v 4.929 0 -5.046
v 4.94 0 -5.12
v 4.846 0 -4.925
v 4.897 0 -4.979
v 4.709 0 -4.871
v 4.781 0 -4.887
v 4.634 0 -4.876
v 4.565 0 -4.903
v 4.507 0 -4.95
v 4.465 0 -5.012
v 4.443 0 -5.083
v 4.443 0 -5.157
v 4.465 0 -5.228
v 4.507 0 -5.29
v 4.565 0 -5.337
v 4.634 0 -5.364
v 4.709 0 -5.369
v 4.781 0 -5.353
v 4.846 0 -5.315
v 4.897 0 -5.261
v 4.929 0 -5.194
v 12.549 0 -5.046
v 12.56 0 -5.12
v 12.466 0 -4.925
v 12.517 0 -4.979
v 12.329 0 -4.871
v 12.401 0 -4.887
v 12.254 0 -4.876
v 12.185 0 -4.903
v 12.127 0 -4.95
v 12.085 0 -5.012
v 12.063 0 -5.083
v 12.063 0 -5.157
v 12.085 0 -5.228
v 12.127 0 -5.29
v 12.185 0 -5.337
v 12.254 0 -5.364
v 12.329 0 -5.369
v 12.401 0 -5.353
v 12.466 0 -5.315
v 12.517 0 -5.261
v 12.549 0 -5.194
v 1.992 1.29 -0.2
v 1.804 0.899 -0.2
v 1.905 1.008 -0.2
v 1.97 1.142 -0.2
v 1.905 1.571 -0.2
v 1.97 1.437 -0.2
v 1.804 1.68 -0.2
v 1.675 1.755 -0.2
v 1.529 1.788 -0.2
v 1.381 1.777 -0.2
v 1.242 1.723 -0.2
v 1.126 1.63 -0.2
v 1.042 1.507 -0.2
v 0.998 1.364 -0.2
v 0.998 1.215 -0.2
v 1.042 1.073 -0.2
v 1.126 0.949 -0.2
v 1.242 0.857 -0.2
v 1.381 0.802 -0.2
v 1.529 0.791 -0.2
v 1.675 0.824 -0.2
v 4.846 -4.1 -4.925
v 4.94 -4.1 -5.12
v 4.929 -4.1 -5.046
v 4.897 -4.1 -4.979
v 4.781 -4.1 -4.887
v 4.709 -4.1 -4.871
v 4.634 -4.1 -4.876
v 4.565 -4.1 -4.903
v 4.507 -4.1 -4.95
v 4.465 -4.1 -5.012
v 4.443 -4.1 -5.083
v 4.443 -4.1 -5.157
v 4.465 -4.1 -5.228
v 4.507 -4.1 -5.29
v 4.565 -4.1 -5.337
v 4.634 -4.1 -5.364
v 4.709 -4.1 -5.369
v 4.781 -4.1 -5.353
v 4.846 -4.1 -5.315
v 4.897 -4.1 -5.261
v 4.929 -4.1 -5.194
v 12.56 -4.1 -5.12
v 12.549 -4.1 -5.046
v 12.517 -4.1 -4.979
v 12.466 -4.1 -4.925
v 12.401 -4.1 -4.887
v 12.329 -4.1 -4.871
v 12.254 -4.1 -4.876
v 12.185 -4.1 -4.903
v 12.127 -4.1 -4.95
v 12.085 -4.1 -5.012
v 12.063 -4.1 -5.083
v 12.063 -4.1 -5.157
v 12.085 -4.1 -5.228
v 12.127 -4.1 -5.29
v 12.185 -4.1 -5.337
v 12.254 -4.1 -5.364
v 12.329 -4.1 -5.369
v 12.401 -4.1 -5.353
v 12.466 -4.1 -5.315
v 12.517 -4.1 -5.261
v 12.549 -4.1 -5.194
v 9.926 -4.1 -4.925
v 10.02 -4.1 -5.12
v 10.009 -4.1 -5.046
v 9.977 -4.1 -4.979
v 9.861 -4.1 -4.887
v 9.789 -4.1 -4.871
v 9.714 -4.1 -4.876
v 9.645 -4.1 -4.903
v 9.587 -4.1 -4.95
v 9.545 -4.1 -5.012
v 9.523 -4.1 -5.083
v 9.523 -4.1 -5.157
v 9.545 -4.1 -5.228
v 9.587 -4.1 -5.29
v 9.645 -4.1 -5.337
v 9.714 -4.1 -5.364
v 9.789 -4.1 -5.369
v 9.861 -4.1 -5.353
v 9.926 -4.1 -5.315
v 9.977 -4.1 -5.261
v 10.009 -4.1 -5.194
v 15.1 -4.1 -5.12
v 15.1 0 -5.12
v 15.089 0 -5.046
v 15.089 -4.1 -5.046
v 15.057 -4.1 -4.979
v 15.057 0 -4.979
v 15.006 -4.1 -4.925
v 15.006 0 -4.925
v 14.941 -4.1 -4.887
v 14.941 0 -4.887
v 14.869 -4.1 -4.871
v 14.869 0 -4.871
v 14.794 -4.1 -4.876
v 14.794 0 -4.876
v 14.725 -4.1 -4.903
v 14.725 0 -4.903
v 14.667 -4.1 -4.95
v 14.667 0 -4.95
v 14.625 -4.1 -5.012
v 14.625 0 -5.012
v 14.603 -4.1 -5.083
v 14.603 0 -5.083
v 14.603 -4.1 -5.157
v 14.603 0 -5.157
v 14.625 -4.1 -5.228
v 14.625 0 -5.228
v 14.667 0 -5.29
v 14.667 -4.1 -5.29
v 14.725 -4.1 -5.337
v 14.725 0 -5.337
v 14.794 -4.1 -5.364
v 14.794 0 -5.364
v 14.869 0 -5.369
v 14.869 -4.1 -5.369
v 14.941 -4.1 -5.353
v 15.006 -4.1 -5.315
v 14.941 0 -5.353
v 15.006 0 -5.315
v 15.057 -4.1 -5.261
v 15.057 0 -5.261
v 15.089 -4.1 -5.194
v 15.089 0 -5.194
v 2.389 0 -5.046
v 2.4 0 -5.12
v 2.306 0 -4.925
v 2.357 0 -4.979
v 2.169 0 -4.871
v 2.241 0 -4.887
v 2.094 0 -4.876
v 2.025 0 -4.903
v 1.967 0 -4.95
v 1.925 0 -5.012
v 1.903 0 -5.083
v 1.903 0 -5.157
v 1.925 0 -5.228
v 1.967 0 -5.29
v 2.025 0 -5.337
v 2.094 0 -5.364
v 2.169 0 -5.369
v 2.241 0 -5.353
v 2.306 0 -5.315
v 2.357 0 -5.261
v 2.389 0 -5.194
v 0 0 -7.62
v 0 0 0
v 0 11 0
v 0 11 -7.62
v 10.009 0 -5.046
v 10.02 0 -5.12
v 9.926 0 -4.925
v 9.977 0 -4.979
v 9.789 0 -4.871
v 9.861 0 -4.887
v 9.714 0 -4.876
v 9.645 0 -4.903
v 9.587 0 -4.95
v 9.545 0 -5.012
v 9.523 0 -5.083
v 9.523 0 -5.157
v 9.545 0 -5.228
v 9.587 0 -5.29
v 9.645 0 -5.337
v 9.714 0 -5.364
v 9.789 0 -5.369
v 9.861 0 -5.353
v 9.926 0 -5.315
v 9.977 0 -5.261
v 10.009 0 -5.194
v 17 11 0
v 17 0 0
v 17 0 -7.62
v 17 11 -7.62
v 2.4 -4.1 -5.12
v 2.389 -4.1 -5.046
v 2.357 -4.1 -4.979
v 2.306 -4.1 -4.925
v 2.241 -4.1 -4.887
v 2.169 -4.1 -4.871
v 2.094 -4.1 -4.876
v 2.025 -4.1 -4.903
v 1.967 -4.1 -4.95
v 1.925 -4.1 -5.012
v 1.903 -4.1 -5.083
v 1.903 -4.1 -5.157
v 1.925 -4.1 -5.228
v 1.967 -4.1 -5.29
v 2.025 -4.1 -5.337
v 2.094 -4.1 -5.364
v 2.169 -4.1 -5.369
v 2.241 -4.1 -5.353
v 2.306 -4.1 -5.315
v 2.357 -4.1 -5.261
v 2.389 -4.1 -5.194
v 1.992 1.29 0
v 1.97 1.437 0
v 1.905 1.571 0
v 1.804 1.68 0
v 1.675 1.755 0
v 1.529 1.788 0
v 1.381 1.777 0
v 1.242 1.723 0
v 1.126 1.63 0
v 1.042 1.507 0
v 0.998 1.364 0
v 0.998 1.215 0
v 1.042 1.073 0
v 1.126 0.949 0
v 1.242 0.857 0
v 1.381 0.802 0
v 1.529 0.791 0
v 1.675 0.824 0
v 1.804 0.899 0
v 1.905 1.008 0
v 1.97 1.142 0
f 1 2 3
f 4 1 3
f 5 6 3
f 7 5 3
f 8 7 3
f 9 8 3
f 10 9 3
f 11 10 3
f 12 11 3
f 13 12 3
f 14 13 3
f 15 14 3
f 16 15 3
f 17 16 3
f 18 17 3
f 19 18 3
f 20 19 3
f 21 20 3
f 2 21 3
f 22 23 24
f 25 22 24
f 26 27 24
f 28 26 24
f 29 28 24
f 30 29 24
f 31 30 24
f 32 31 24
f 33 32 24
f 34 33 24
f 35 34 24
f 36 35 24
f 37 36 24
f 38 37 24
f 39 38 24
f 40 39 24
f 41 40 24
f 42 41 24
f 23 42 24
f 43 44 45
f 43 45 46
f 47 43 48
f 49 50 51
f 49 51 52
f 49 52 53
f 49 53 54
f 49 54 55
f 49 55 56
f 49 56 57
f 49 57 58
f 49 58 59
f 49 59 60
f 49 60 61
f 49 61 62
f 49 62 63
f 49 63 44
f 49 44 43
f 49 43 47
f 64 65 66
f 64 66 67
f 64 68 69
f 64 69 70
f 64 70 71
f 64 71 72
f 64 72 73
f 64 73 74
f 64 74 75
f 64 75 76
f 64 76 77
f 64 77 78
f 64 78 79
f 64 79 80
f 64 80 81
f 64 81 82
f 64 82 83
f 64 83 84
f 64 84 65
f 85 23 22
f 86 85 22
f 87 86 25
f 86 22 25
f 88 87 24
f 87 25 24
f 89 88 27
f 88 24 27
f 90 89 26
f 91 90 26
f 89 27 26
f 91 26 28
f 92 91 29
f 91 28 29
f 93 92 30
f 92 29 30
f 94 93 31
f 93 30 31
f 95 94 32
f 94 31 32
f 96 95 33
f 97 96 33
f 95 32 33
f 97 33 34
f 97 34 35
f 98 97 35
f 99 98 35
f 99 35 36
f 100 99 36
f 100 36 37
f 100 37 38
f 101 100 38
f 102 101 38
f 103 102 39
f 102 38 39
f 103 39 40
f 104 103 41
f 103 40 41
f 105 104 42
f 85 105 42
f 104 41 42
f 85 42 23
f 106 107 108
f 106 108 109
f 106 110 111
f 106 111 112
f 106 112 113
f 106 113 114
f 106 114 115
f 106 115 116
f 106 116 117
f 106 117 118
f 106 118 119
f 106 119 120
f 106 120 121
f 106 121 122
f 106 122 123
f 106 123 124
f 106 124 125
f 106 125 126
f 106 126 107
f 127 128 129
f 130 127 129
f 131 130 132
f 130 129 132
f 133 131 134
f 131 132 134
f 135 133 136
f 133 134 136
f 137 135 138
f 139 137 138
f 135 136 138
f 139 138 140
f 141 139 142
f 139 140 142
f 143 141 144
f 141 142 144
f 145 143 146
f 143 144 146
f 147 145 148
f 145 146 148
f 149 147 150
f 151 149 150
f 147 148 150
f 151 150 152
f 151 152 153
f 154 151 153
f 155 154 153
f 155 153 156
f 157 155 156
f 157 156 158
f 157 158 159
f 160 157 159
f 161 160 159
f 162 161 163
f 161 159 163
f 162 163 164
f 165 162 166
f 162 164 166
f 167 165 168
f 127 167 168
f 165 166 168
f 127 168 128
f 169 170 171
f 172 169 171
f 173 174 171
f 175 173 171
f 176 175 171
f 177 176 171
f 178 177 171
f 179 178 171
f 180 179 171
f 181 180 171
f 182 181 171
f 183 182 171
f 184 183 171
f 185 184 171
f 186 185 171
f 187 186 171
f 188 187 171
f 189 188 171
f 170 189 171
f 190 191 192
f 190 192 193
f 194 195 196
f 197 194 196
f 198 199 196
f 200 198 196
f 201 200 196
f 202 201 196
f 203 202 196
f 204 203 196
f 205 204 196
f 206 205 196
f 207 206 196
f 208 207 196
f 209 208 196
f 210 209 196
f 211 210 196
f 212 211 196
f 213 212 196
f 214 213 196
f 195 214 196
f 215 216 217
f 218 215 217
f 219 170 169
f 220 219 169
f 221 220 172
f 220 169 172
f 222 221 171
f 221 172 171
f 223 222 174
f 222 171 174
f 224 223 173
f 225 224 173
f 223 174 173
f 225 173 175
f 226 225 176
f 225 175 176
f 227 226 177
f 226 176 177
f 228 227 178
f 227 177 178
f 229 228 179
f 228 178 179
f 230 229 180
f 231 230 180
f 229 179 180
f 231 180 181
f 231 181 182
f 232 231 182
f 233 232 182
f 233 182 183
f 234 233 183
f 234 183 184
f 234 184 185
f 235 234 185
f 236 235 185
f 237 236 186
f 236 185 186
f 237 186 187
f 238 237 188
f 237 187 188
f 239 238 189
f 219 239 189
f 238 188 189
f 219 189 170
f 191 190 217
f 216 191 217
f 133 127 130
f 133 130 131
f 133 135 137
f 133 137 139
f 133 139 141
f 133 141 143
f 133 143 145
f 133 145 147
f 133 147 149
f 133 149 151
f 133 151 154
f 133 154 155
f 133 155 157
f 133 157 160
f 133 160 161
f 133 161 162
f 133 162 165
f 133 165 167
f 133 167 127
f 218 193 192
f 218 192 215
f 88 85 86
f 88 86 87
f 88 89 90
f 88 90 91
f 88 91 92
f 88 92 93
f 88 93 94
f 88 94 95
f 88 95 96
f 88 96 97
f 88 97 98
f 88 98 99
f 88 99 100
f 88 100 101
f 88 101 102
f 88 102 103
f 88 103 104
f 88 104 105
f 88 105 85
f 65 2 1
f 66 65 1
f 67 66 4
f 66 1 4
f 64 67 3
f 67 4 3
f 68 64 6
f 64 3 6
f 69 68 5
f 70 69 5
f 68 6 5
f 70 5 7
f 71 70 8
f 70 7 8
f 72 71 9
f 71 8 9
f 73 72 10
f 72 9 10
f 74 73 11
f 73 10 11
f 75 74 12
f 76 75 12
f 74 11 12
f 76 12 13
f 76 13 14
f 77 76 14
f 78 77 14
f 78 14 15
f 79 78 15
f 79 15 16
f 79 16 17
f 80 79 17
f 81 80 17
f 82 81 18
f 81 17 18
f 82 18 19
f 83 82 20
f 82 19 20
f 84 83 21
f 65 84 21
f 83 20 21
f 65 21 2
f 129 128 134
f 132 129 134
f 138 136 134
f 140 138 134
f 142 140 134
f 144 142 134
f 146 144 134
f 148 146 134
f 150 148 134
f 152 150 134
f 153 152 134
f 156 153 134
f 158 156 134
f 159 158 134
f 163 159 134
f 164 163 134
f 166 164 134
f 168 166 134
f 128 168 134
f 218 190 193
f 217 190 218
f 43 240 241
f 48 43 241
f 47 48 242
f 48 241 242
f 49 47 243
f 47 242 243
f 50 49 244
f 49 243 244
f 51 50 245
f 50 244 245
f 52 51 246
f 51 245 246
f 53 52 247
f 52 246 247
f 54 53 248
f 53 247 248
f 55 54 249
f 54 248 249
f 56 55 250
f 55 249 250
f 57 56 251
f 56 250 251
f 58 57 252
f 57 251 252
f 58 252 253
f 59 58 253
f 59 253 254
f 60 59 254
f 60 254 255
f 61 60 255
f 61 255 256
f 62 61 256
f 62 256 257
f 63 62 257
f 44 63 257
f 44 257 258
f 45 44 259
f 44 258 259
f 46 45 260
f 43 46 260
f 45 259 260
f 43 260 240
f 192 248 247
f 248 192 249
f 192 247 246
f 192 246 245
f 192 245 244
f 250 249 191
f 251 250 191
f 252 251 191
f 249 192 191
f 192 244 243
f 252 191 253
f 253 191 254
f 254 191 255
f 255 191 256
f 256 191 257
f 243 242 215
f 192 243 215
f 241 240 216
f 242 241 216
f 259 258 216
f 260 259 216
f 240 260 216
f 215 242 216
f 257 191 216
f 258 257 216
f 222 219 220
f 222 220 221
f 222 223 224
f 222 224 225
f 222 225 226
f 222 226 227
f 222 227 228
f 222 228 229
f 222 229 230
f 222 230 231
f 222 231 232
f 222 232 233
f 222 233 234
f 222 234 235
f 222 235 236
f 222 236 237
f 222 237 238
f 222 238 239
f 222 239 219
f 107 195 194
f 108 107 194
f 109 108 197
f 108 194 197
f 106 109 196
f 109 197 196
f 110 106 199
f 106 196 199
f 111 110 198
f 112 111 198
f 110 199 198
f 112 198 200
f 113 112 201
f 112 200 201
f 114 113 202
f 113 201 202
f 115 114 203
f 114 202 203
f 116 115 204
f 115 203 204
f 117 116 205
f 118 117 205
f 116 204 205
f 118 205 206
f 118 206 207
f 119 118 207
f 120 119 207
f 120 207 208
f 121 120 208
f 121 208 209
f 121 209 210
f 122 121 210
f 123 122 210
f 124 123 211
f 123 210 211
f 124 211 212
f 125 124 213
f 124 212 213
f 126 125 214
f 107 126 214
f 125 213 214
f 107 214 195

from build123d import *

# Parameters (mm, degrees)
SKETCH1_W             = 17
SKETCH1_H             = 7.62
BOSS_EXTRUDE1_DEPTH   = 11
SKETCH2_R             = 0.25
BOSS_EXTRUDE2_DEPTH   = 4.1
BOSS_EXTRUDE2_2_DEPTH = 4.1
BOSS_EXTRUDE2_3_DEPTH = 4.1
BOSS_EXTRUDE2_4_DEPTH = 4.1
BOSS_EXTRUDE2_5_DEPTH = 4.1
SKETCH3_R             = 0.5
CUT_EXTRUDE1_DEPTH    = 0.2


with BuildPart() as part:
    # Sketch1 → Boss-Extrude1 (new body)
    with BuildSketch(Plane(origin=(0, 0, 0), x_dir=(1, 0, 0), z_dir=(0, 1, 0))):
        with Locations((8.5, 3.81)):
            Rectangle(SKETCH1_W, SKETCH1_H)
    extrude(amount=BOSS_EXTRUDE1_DEPTH)

    # Sketch3 → Cut-Extrude1 (cut)
    with BuildSketch(Plane.XY):
        with Locations((1.492027109, 1.289577557)):
            Circle(SKETCH3_R)
    extrude(amount=-CUT_EXTRUDE1_DEPTH, mode=Mode.SUBTRACT)


with BuildPart() as body_2:
    # Sketch2 → Boss-Extrude2 (new body)
    with BuildSketch(Plane.XZ):
        with Locations((2.15, -5.12)):
            Circle(SKETCH2_R)
    extrude(amount=BOSS_EXTRUDE2_DEPTH)


with BuildPart() as body_3:
    # Sketch2 → Boss-Extrude2 2 (new body)
    with BuildSketch(Plane.XZ):
        with Locations((4.69, -5.12)):
            Circle(SKETCH2_R)
    extrude(amount=BOSS_EXTRUDE2_2_DEPTH)


with BuildPart() as body_4:
    # Sketch2 → Boss-Extrude2 3 (new body)
    with BuildSketch(Plane.XZ):
        with Locations((9.77, -5.12)):
            Circle(SKETCH2_R)
    extrude(amount=BOSS_EXTRUDE2_3_DEPTH)


with BuildPart() as body_5:
    # Sketch2 → Boss-Extrude2 4 (new body)
    with BuildSketch(Plane.XZ):
        with Locations((12.31, -5.12)):
            Circle(SKETCH2_R)
    extrude(amount=BOSS_EXTRUDE2_4_DEPTH)


with BuildPart() as body_6:
    # Sketch2 → Boss-Extrude2 5 (new body)
    with BuildSketch(Plane.XZ):
        with Locations((14.85, -5.12)):
            Circle(SKETCH2_R)
    extrude(amount=BOSS_EXTRUDE2_5_DEPTH)


solid = Compound([part.part, body_2.part, body_3.part, body_4.part, body_5.part, body_6.part])
